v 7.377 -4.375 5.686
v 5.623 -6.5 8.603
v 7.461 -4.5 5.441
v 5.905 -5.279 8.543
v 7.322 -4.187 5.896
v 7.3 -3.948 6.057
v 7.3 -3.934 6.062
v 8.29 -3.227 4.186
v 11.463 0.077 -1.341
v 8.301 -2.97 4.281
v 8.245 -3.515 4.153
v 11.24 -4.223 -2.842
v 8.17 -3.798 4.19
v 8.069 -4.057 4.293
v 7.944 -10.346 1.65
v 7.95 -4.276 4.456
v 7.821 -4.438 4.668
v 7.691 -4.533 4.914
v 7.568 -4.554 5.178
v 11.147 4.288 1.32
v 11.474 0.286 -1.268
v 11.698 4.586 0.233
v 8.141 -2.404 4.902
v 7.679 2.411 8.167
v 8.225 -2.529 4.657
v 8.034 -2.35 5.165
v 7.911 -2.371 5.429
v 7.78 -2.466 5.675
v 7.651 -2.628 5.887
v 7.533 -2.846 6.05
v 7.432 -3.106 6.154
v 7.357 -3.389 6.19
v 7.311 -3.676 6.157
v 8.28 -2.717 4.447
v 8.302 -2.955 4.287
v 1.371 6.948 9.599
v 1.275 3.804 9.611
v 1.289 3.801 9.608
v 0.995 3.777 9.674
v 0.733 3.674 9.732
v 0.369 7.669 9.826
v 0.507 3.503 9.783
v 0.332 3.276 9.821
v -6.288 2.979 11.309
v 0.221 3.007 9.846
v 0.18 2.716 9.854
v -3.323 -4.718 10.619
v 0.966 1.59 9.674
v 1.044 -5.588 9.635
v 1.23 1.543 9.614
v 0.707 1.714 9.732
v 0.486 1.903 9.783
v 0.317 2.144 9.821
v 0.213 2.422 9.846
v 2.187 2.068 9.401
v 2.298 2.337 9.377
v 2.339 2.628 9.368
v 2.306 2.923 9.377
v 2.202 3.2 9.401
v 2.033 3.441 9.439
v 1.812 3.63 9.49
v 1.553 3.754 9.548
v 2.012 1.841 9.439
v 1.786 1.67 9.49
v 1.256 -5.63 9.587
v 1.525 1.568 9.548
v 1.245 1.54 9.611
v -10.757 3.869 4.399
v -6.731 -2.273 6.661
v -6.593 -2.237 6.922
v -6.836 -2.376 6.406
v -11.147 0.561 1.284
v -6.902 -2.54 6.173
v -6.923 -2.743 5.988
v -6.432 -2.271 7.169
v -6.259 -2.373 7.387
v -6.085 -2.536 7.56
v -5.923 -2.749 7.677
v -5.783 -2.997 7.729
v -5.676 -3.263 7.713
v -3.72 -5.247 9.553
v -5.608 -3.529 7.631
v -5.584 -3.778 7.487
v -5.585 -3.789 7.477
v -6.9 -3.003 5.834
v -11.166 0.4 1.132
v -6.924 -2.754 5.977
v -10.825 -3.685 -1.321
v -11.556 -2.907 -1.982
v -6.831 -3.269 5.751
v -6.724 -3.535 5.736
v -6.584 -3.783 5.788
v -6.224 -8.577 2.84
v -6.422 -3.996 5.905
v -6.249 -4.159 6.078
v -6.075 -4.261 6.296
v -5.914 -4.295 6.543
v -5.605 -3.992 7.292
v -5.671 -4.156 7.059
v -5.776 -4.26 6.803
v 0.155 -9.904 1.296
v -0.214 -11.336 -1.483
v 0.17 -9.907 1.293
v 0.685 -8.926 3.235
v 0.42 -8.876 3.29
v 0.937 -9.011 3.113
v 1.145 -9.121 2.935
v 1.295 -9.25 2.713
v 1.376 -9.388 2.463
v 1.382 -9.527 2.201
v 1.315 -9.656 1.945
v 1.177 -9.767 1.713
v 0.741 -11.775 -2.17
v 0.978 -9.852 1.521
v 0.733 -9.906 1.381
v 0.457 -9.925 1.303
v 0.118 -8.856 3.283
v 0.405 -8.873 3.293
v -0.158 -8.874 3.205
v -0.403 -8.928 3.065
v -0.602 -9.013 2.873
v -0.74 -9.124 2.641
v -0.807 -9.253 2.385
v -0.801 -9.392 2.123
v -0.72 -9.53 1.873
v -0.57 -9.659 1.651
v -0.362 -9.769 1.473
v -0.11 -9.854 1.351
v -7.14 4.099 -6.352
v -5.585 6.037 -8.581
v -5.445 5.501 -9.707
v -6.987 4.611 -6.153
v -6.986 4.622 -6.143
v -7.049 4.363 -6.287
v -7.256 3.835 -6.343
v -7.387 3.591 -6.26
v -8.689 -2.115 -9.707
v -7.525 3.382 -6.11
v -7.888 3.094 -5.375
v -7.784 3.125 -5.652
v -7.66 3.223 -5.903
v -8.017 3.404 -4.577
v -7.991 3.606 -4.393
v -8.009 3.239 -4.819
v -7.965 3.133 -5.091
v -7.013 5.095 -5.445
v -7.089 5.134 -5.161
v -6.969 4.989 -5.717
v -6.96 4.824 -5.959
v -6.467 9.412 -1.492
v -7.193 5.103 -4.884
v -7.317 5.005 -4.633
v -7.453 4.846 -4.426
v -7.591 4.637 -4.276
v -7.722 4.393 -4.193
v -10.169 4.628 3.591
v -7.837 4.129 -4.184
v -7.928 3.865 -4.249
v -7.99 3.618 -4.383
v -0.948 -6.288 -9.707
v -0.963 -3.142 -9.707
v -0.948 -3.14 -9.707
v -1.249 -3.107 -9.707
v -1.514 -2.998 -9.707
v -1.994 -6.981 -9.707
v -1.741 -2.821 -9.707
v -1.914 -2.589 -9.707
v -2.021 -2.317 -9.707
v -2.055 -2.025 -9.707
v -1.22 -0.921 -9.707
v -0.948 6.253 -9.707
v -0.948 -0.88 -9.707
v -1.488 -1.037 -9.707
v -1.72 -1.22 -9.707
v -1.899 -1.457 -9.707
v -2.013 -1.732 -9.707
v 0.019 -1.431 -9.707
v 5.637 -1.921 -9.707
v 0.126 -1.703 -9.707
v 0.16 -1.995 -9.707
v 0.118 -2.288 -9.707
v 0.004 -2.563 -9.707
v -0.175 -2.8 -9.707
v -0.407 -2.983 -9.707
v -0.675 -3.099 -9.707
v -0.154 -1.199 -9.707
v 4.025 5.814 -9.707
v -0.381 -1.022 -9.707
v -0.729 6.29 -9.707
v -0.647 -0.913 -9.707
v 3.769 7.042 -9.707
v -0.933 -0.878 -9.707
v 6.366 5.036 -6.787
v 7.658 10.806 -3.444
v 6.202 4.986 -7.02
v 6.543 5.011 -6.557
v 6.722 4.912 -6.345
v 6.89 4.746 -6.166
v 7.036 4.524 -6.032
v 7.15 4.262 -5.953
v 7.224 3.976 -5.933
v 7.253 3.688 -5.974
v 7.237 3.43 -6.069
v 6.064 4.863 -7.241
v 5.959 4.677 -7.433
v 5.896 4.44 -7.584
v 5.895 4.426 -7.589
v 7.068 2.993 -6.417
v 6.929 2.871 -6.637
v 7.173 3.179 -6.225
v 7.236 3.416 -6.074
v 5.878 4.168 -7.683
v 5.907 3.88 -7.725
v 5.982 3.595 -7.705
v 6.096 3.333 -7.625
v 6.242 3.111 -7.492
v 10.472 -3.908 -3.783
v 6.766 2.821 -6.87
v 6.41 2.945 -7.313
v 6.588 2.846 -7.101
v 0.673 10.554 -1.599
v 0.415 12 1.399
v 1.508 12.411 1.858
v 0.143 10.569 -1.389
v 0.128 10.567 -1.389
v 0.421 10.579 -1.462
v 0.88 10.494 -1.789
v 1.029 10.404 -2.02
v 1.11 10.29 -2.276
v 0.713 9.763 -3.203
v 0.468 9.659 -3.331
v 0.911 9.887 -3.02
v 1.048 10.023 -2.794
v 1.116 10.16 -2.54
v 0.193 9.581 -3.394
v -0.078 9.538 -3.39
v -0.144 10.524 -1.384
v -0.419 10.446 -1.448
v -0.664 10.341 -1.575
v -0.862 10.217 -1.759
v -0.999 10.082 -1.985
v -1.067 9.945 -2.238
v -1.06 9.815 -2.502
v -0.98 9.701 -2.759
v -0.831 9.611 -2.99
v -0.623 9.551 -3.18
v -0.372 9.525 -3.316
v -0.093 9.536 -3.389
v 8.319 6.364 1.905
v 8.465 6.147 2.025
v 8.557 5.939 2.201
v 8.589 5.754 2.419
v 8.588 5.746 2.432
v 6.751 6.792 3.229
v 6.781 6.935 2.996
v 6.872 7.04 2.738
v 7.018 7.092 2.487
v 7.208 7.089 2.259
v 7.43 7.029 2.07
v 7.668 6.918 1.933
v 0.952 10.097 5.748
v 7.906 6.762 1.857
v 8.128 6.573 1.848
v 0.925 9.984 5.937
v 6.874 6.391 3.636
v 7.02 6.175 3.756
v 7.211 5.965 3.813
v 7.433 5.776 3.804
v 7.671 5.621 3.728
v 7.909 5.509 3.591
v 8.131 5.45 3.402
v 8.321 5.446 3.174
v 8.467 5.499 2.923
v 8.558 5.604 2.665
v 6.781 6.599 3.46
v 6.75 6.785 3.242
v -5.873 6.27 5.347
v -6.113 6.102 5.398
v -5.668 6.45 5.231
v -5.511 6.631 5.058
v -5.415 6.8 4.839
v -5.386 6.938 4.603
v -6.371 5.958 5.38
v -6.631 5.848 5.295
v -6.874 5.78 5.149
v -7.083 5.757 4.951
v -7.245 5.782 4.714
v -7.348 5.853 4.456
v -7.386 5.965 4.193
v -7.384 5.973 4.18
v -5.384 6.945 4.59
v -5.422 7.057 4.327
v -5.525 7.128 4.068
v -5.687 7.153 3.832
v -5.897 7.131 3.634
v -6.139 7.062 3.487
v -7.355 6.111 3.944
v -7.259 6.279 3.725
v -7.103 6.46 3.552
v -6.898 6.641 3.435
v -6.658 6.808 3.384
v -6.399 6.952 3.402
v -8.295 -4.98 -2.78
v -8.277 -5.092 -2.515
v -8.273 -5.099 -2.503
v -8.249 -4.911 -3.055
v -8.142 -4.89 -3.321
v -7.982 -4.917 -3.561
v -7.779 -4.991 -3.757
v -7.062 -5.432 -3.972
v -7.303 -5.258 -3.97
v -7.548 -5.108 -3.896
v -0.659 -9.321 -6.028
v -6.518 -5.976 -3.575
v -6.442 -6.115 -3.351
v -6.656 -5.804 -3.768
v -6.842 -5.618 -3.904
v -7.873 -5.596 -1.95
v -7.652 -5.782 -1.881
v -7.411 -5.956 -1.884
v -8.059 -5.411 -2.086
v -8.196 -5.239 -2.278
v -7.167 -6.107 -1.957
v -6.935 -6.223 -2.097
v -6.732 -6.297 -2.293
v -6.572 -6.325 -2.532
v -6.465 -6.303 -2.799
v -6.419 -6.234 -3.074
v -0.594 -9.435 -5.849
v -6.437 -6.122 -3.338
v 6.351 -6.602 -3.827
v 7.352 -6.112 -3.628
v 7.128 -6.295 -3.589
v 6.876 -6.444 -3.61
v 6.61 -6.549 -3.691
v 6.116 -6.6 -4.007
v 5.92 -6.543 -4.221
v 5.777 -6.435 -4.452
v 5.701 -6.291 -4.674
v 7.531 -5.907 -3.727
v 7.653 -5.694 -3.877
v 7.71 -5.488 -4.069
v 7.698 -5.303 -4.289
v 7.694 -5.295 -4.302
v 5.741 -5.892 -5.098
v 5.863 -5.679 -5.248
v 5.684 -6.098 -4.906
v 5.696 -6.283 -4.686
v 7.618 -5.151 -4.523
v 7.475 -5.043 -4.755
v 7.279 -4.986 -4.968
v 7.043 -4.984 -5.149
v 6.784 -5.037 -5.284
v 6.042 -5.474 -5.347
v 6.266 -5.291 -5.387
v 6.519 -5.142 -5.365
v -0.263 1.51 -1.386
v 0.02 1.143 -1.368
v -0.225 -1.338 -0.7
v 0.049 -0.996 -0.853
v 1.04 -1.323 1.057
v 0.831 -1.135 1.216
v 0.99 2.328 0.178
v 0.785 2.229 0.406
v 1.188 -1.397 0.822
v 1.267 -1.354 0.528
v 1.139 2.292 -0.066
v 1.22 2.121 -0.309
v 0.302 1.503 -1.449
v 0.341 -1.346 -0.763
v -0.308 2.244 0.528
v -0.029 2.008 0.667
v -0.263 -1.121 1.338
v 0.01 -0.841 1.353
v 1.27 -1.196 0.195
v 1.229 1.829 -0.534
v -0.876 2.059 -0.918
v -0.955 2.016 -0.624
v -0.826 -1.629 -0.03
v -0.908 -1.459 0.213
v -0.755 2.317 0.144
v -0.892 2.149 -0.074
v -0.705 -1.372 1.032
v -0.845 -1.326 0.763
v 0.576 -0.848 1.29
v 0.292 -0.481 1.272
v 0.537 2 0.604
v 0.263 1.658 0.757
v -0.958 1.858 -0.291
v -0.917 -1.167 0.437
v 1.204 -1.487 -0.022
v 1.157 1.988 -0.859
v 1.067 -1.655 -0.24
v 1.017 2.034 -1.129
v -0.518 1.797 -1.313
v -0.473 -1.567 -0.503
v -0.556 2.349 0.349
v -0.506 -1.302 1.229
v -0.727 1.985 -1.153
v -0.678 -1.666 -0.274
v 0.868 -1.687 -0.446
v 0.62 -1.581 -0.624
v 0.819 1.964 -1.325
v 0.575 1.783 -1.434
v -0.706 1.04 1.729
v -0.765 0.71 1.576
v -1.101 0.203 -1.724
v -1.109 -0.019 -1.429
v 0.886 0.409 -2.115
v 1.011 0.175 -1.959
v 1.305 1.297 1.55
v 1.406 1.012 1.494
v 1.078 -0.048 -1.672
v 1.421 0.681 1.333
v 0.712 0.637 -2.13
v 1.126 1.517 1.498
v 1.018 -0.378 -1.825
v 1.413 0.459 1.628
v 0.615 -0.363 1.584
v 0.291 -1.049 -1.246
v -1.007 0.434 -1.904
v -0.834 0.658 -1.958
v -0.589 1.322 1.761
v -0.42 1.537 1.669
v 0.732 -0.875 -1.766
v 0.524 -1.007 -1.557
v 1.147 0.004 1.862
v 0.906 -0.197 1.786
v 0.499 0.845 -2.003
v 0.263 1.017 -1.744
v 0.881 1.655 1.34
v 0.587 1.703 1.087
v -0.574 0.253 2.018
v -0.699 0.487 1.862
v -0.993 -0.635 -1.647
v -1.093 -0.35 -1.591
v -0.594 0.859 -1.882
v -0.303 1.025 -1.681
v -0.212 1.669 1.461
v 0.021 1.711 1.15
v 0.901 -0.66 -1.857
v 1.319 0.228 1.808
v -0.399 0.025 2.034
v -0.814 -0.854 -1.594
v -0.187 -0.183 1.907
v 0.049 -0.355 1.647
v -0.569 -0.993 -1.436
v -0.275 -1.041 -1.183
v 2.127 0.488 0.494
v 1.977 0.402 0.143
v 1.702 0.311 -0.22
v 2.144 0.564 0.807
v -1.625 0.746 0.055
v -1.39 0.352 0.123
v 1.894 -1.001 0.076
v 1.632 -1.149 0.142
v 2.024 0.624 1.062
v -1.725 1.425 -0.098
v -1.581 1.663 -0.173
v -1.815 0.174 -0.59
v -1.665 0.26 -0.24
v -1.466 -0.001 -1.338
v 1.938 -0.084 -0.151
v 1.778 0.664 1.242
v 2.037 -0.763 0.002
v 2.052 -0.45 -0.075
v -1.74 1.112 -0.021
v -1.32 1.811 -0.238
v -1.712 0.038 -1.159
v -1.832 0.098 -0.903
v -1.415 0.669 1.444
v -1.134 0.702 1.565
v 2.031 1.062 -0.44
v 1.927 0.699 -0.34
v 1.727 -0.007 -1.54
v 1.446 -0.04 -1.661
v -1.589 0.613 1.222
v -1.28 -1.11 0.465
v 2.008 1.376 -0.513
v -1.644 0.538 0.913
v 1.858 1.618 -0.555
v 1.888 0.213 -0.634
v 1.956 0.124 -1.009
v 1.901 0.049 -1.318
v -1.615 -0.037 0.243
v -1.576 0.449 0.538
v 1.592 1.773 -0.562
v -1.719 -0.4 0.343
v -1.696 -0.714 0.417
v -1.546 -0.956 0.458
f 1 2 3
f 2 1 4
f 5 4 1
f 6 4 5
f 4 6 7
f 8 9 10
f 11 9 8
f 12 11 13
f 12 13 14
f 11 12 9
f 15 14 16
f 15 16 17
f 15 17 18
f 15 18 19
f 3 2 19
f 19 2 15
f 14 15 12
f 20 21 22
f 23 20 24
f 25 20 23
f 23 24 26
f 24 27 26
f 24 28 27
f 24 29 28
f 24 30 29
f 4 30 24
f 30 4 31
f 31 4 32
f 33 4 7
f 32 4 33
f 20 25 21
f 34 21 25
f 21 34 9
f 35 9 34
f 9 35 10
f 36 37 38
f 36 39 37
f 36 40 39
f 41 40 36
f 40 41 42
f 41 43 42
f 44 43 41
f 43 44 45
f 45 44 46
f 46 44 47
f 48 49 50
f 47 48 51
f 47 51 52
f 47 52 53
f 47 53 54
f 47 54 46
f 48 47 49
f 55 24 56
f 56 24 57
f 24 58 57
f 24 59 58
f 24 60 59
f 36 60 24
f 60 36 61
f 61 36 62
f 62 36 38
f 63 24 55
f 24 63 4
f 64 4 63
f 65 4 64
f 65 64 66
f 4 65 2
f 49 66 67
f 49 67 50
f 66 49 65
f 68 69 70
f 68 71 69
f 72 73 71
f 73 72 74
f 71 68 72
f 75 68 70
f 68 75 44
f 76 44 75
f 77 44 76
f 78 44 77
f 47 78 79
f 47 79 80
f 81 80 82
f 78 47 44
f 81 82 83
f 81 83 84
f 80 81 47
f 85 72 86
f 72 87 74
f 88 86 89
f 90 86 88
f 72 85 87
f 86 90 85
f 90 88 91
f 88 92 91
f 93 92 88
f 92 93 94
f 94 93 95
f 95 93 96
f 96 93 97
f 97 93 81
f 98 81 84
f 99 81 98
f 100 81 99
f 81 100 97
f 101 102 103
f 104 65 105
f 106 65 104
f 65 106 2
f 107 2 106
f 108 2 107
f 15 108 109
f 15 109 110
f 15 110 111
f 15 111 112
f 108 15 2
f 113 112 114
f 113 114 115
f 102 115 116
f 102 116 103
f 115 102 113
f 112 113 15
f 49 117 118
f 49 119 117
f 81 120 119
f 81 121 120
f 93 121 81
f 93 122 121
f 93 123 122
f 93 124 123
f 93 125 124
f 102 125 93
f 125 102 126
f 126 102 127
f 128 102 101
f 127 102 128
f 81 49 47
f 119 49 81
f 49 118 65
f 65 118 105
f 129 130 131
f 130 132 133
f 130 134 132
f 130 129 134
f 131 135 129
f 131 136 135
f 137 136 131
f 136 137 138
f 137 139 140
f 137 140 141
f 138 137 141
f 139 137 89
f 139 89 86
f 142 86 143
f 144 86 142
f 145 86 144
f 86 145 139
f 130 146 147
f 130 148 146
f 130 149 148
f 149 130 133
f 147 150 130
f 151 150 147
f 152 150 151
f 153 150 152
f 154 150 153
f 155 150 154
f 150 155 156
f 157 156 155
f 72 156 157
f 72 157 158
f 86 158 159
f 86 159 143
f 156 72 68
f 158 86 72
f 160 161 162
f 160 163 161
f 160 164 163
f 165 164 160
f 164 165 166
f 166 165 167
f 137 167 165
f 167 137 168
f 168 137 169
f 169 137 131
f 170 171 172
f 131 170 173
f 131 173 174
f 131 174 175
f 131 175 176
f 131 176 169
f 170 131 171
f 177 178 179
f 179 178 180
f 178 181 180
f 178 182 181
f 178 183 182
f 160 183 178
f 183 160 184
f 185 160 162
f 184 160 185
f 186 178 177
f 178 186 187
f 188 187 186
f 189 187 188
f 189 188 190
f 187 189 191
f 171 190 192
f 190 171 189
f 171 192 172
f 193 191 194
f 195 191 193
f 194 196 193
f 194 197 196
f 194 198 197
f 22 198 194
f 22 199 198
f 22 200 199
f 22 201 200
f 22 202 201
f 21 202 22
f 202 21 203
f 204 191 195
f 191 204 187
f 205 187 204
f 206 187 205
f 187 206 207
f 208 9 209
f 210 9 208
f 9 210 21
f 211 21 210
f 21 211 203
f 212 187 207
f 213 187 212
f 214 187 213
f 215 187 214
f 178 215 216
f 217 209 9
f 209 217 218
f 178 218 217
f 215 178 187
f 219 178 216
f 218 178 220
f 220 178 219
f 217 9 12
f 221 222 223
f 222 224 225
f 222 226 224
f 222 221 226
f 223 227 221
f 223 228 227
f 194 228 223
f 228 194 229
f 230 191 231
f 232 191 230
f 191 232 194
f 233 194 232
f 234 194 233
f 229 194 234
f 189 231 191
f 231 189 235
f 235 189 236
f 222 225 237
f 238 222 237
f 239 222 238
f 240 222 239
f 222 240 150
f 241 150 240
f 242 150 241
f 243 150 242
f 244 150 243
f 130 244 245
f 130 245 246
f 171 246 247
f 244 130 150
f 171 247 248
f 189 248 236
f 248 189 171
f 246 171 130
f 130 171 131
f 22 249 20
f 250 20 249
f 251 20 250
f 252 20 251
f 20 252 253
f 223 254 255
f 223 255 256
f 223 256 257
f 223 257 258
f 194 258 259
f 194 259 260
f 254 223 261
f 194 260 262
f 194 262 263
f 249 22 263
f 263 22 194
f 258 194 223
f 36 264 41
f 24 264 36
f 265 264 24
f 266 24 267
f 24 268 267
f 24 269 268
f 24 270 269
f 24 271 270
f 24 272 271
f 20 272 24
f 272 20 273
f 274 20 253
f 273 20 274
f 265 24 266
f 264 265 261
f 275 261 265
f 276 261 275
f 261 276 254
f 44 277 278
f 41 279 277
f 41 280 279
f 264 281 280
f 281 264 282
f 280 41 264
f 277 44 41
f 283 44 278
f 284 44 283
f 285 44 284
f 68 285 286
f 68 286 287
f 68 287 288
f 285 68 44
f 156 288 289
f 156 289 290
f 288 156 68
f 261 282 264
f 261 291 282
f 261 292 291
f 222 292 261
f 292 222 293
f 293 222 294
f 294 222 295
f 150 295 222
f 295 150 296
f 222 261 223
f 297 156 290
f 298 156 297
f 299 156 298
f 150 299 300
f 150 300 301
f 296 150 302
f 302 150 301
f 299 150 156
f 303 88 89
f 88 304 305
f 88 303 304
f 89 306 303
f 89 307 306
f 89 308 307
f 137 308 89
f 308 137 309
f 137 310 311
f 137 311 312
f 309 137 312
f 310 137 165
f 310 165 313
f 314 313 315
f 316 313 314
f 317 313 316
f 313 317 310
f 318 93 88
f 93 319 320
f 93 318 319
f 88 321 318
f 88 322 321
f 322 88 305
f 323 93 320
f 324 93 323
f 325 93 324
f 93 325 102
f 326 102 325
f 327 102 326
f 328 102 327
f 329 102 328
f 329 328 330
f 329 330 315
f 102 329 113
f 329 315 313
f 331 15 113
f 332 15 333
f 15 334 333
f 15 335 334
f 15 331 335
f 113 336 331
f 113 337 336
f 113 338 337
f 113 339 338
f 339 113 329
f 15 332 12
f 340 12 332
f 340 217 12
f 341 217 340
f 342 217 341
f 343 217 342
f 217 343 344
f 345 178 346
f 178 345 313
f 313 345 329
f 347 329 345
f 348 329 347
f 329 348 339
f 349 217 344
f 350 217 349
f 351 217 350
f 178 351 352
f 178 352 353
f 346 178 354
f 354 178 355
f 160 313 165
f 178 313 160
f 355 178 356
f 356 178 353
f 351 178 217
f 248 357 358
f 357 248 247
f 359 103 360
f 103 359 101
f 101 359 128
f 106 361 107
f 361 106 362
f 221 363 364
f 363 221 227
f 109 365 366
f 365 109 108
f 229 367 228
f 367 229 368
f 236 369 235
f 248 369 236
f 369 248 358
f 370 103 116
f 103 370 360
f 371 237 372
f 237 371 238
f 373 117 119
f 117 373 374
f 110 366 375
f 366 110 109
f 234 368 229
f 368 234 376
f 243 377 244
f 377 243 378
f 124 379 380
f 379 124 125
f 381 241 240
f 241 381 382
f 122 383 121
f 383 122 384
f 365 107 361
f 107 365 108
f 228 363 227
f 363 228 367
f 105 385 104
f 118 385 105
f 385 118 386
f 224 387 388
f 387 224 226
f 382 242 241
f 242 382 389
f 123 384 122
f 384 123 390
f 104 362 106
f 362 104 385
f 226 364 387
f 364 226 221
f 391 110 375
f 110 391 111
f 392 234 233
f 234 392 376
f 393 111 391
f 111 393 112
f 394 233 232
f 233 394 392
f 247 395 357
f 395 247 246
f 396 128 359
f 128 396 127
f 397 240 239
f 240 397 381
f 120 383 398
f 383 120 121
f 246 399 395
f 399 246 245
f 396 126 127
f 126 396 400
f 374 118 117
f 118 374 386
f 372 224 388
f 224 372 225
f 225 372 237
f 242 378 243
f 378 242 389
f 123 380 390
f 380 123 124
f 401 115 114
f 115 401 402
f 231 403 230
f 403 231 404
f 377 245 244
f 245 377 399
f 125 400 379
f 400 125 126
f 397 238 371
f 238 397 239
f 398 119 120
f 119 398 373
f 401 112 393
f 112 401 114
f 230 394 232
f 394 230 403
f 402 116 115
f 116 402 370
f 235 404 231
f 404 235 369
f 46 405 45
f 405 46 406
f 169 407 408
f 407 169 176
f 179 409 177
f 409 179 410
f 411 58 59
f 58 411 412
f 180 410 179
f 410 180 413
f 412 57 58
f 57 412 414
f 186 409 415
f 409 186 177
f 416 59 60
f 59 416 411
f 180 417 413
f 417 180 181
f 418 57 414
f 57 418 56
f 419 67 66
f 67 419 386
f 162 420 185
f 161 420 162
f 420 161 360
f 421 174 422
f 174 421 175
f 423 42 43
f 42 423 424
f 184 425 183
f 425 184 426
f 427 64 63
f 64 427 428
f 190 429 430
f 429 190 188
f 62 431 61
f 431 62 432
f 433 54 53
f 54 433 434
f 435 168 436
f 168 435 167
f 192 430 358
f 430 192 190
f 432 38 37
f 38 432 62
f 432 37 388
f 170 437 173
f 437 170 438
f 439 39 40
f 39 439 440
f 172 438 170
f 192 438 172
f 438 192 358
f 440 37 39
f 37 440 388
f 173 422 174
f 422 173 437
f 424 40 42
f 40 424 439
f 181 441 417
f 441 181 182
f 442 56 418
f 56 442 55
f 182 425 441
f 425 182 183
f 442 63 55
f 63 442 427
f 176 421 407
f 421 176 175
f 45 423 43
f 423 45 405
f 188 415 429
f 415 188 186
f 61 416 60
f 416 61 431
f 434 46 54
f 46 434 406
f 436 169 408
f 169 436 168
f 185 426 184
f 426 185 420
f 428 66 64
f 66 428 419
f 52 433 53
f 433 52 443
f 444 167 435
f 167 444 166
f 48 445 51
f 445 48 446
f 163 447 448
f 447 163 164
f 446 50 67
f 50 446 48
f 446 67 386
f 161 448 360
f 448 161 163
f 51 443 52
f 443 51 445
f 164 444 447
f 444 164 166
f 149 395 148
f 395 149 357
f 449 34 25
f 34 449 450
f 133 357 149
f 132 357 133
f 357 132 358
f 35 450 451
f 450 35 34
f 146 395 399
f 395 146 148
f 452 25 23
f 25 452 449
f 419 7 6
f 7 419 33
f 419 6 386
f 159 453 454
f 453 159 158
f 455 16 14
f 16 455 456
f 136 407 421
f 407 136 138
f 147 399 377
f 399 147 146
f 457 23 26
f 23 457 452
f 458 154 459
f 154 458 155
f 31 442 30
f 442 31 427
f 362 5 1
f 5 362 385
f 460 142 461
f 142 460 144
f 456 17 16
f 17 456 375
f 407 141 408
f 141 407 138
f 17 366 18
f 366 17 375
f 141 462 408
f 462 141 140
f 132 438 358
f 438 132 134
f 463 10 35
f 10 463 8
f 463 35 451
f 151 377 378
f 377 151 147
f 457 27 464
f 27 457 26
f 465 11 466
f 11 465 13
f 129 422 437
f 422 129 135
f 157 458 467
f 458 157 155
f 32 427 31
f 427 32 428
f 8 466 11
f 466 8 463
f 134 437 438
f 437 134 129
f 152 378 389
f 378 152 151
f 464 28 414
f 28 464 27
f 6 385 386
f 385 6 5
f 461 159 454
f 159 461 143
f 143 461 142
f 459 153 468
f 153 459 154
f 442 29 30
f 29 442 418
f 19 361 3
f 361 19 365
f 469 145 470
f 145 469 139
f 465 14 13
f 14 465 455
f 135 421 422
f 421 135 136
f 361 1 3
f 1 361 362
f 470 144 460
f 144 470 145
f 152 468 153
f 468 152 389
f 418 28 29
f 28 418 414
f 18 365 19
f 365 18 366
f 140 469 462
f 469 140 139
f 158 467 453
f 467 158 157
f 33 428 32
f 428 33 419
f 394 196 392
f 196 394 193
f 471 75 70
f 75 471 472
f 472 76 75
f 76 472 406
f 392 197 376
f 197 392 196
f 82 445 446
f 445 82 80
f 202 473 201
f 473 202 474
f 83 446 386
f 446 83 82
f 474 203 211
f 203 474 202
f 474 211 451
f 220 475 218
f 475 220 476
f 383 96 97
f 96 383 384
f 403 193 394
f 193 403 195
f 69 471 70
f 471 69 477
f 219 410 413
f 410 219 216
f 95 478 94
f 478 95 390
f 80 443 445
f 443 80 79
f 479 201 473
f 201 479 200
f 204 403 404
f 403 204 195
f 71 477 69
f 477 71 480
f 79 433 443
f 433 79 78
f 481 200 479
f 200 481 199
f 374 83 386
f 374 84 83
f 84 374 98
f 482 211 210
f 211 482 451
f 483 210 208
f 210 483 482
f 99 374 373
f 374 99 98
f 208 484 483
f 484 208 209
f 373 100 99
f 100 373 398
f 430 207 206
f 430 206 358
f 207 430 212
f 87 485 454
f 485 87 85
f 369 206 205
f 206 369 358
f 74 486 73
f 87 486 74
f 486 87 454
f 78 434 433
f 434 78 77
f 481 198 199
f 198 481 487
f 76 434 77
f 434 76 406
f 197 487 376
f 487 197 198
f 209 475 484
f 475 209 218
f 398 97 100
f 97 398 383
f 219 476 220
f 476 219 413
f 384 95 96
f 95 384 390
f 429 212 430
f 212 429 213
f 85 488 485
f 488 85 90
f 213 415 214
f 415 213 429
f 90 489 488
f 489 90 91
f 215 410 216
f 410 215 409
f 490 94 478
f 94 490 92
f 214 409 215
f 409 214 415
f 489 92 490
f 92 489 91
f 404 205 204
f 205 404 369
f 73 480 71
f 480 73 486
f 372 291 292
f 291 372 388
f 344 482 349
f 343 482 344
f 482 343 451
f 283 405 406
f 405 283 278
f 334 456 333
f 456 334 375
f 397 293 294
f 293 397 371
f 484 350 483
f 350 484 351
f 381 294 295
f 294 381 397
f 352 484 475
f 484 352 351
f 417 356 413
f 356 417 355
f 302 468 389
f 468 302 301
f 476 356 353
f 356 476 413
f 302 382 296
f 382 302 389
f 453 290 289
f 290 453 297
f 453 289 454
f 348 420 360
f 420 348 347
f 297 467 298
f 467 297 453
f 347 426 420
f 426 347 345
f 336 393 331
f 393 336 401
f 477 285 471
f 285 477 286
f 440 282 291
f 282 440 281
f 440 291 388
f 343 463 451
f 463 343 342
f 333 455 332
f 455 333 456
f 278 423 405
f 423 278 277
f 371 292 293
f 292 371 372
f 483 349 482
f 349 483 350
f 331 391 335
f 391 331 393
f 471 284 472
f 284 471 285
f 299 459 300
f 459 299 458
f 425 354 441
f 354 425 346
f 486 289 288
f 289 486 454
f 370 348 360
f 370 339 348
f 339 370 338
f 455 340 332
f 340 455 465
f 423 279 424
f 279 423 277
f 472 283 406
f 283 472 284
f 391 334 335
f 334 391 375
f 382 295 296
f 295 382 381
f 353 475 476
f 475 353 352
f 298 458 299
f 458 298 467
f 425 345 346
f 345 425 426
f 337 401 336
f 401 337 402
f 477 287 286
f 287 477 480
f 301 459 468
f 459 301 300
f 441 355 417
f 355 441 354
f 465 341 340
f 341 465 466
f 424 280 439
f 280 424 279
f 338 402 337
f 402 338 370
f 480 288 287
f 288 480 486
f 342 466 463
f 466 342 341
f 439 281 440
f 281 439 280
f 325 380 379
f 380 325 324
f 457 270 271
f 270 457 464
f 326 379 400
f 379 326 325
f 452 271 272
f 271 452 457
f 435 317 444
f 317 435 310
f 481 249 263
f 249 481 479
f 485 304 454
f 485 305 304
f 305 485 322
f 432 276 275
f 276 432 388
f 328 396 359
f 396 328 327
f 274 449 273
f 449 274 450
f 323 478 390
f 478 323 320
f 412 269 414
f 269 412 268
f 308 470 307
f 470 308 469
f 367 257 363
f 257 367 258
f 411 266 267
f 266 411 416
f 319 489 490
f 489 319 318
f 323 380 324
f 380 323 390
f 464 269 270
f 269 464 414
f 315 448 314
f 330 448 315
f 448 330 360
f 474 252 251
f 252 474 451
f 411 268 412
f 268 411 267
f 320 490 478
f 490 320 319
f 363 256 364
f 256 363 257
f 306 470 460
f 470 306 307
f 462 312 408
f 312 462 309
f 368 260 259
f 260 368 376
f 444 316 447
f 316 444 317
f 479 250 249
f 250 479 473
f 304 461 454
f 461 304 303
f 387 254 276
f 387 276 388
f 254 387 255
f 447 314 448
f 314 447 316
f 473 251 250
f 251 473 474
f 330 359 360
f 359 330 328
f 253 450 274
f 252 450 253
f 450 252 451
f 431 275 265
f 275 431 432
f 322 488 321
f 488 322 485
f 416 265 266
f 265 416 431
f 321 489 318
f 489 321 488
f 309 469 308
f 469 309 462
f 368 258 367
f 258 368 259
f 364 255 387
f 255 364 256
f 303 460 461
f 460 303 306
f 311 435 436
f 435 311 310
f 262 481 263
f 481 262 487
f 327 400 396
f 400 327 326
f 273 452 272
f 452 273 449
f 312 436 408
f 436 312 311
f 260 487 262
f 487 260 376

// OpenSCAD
//Шаг сетки для решётки из ромбододекаэдров (межцентровое расстояние)
MM_GRID_STEP = 20.0;

//диаметр отвертия (диаметр описанной окружности около многоугольника детализации)
//если диаметр = 0, то отверстий нет, 2.2 = диаметр зубочистки
MM_HOLE_DIAMETER = 2.2;

//true-false параметр, показывающия исходный ромбододекаэдр без скоса
//для подсветки и разработки делай true, для 3Д-печати делай false
WILL_SHOW_CORE = false;

//длина укороченной чёрной стороны (когда 1 - ось поворта по короткой диагонали)
//ось поворота - это граница цветов 
//синее море внизу и белое небо сверху на видео от Певницкого 15 мая
CUT_RATIO = 0.75;
//синее море внизу и белое небо сверху, если угол положительный
CUT_DEGREE = 15;

//такой n-угольник для детализации отверстия
HOLE_DETALISATION_IS_N_POLYGON = 24;

CUBE_SIDE = MM_GRID_STEP / sqrt(2);

//тетраэдр по четырём точкам, точка номер ноль - вершина
module m_tetrahedron(p4) {
    polyhedron(points=p4, faces=[[0,1,2],[0,2,3],[0,3,1],[3,2,1]]);
}

//пирамида с четырёхугольноком в основании, точка номер ноль - вершина
module m_p5_pyramid(p5) {
    polyhedron(points=p5, faces=[[0,1,2],[0,2,3],[0,3,4],[0,4,1],[4,3,2,1]]);
}

module m_p4_p5(p4_or_p5) {
    if (len(p4_or_p5) == 4) {m_tetrahedron(p4_or_p5);} else {m_p5_pyramid(p4_or_p5);}
}

//интерполирование по прямой с точками р0(ноль) и р1(один) любым вещественным числом
//массивы (три координаты) тоже можно складывать и умножать на число
function f_n01(p0, p1, n01) = ((p1 - p0) * n01) + p0;

//сумма массива с любым числом точек (рекурсивно)
function f_sum_recursion(array_p, my_result, i) =
    ((i>=len(array_p)) ?
        my_result :
        f_sum_recursion(array_p, my_result + array_p[i], i+1));

//сумма векторов, array_p[0] * 0 - нужно, чтобы получить необходимое число нулей [0,0,0]
function f_sum(array_p) = f_sum_recursion(array_p, array_p[0] * 0, 0);

//центр массива точек
function f_center(array_p) = f_sum(array_p) * (1 / len(array_p));

//синтаксис для переменных (в том числе, функциональных переменных)
function f_three_or_four_points_extend(p3_or_p4, my_scale = 1) =
    let (c = f_center(p3_or_p4))
    let (f = function (i) f_n01(c, p3_or_p4[i], my_scale))
(len(p3_or_p4)==3) ? [f(0), f(1), f(2)] : [f(0), f(1), f(2), f(3)];


function f_half_space(p3_or_p4, scale_triangle = 1, scale_pyramyd_ratio = 1) = 
    let (p3_or_p4 = f_three_or_four_points_extend(p3_or_p4, scale_triangle))
    let (scale_to_apex = scale_triangle * scale_pyramyd_ratio)
    let (p_apex = f_n01(f_center(p3_or_p4), [0,0,0], scale_to_apex))
    let (arr_3 = [p_apex, p3_or_p4[0], p3_or_p4[1], p3_or_p4[2]])
    let (arr_4 = [p_apex, p3_or_p4[0], p3_or_p4[1], p3_or_p4[2], p3_or_p4[3]])
(len(p3_or_p4)==3) ? arr_3 : arr_4;

PX = [2,0,0]; PY = [0,2,0]; PZ = [0,0,2]; MX = [-2,0,0]; MY = [0,-2,0]; MZ = [0,0,-2];
CX = [1,-1,-1]; CY = [-1,1,-1]; CZ = [-1,-1,1]; 
CXY = [1,1,-1]; CYZ = [-1,1,1]; CXZ = [1,-1,1];
CXYZ = [1,1,1]; CMMM = [-1,-1,-1];

//вершины граней против часовой стрелки, если смотреть снаружи
face_0 = [PX, CXZ, PZ, CXYZ];
face_1 = [PZ, CYZ, PY, CXYZ];
face_2 = [MX, CYZ, PZ, CZ];
face_3 = [PZ, CXZ, MY, CZ];

face_4 = [MX, CMMM, MZ, CY];
face_5 = [MZ, CMMM, MY, CX];
face_6 = [PX, CXY, MZ, CX];
face_7 = [MZ, CXY, PY, CY];

face_8 = [PY, CXY, PX, CXYZ];
face_9 = [PY, CYZ, MX, CY];
face_10 = [MY, CMMM, MX, CZ];
face_11 = [MY, CXZ, PX, CX];

face_all = [face_0, face_1, face_2, face_3, face_4, face_5, face_6, face_7, face_8, face_9, face_10, face_11];

module m_face(i_face, scale_triangle = 1, scale_pyramyd_ratio = 1) {
    p4 = face_all[i_face];
    
    p_rhombus = [p4[0], p4[1], p4[2], p4[3]];
    
    m_p4_p5(f_half_space(p_rhombus, scale_triangle, scale_pyramyd_ratio)); 
}

function f_axis(p4, my_ratio = CUT_RATIO) = [f_n01(p4[0], p4[1], my_ratio), f_n01(p4[2], p4[3], my_ratio)];

module m_my_rotation_on_axis(i_face, a_deg = CUT_DEGREE, my_ratio = CUT_RATIO) {
    ab = f_axis(face_all[i_face], my_ratio);
    translate(ab[1])
        rotate(a = a_deg, v = ab[1] - ab[0])
            translate(ab[1] * (-1))
                children();
} 
 
module m_rotated_face(i_face, a_deg = CUT_DEGREE, my_ratio = CUT_RATIO) {
    m_my_rotation_on_axis(i_face, a_deg, my_ratio)
        m_face(i_face, 8, 1);
}

ARR_COLORS = [[1,0,0],[1,1,0],[0,1,0], [1,1,1],[1,1,1],[0,0,0],[1,1,1],[1,1,1],[1,1,1],[1,1,1],[1,1,1],[1,1,1]];

module m_12_faces(will_show_not_rotated_core = WILL_SHOW_CORE, cut_ratio = CUT_RATIO, cut_degree = CUT_DEGREE) {
    intersection_for(n = [0 : 11]){
        //color(ARR_COLORS[n])
        hull(){m_rotated_face(n, cut_degree, cut_ratio);}
    }
    
    if (will_show_not_rotated_core)
    #rotate(0){
        m_face(0);m_face(1);m_face(2);m_face(3);
        m_face(4);m_face(5); m_face(6);m_face(7);
        m_face(8);m_face(9);m_face(10);m_face(11);
    }
}

module m_cylinder(rotate_axe=[0,0,1], rotate_deg=45, d=MM_HOLE_DIAMETER, half_h=(MM_GRID_STEP * 0.5) * 4.2) {
    rotate (a=rotate_deg, v=rotate_axe)
        cylinder(h=half_h*2, d=d, center=true, $fn=HOLE_DETALISATION_IS_N_POLYGON);
}

module m_all_cylinders() {
    if (MM_HOLE_DIAMETER > 0) {
        m_cylinder([+1,0,0], +45); m_cylinder([+1,0,0], -45); 
        m_cylinder([0,+1,0], +45); m_cylinder([0,+1,0], -45);
        m_cylinder([+1,+1,0], 90); m_cylinder([+1,-1,0], 90);
    }
}

module m_final(cut_ratio, cut_degree, xyz_n_step = [0,0,0], show_core = WILL_SHOW_CORE) {
    translate(v = xyz_n_step * MM_GRID_STEP)    
        rotate(a = 45, v=[1,0,0])
            m_my_rotation_on_axis(5, -CUT_DEGREE)
            difference () {
                scale (CUBE_SIDE / 2) m_12_faces(show_core, cut_ratio, cut_degree);
                m_all_cylinders();
            }
}

//[1.0 - 0.75], [45 - 15]
//m_final(1 - (1-$t) * 0.25, 45 - (1-$t) * 30);

m_final(CUT_RATIO, CUT_DEGREE);
